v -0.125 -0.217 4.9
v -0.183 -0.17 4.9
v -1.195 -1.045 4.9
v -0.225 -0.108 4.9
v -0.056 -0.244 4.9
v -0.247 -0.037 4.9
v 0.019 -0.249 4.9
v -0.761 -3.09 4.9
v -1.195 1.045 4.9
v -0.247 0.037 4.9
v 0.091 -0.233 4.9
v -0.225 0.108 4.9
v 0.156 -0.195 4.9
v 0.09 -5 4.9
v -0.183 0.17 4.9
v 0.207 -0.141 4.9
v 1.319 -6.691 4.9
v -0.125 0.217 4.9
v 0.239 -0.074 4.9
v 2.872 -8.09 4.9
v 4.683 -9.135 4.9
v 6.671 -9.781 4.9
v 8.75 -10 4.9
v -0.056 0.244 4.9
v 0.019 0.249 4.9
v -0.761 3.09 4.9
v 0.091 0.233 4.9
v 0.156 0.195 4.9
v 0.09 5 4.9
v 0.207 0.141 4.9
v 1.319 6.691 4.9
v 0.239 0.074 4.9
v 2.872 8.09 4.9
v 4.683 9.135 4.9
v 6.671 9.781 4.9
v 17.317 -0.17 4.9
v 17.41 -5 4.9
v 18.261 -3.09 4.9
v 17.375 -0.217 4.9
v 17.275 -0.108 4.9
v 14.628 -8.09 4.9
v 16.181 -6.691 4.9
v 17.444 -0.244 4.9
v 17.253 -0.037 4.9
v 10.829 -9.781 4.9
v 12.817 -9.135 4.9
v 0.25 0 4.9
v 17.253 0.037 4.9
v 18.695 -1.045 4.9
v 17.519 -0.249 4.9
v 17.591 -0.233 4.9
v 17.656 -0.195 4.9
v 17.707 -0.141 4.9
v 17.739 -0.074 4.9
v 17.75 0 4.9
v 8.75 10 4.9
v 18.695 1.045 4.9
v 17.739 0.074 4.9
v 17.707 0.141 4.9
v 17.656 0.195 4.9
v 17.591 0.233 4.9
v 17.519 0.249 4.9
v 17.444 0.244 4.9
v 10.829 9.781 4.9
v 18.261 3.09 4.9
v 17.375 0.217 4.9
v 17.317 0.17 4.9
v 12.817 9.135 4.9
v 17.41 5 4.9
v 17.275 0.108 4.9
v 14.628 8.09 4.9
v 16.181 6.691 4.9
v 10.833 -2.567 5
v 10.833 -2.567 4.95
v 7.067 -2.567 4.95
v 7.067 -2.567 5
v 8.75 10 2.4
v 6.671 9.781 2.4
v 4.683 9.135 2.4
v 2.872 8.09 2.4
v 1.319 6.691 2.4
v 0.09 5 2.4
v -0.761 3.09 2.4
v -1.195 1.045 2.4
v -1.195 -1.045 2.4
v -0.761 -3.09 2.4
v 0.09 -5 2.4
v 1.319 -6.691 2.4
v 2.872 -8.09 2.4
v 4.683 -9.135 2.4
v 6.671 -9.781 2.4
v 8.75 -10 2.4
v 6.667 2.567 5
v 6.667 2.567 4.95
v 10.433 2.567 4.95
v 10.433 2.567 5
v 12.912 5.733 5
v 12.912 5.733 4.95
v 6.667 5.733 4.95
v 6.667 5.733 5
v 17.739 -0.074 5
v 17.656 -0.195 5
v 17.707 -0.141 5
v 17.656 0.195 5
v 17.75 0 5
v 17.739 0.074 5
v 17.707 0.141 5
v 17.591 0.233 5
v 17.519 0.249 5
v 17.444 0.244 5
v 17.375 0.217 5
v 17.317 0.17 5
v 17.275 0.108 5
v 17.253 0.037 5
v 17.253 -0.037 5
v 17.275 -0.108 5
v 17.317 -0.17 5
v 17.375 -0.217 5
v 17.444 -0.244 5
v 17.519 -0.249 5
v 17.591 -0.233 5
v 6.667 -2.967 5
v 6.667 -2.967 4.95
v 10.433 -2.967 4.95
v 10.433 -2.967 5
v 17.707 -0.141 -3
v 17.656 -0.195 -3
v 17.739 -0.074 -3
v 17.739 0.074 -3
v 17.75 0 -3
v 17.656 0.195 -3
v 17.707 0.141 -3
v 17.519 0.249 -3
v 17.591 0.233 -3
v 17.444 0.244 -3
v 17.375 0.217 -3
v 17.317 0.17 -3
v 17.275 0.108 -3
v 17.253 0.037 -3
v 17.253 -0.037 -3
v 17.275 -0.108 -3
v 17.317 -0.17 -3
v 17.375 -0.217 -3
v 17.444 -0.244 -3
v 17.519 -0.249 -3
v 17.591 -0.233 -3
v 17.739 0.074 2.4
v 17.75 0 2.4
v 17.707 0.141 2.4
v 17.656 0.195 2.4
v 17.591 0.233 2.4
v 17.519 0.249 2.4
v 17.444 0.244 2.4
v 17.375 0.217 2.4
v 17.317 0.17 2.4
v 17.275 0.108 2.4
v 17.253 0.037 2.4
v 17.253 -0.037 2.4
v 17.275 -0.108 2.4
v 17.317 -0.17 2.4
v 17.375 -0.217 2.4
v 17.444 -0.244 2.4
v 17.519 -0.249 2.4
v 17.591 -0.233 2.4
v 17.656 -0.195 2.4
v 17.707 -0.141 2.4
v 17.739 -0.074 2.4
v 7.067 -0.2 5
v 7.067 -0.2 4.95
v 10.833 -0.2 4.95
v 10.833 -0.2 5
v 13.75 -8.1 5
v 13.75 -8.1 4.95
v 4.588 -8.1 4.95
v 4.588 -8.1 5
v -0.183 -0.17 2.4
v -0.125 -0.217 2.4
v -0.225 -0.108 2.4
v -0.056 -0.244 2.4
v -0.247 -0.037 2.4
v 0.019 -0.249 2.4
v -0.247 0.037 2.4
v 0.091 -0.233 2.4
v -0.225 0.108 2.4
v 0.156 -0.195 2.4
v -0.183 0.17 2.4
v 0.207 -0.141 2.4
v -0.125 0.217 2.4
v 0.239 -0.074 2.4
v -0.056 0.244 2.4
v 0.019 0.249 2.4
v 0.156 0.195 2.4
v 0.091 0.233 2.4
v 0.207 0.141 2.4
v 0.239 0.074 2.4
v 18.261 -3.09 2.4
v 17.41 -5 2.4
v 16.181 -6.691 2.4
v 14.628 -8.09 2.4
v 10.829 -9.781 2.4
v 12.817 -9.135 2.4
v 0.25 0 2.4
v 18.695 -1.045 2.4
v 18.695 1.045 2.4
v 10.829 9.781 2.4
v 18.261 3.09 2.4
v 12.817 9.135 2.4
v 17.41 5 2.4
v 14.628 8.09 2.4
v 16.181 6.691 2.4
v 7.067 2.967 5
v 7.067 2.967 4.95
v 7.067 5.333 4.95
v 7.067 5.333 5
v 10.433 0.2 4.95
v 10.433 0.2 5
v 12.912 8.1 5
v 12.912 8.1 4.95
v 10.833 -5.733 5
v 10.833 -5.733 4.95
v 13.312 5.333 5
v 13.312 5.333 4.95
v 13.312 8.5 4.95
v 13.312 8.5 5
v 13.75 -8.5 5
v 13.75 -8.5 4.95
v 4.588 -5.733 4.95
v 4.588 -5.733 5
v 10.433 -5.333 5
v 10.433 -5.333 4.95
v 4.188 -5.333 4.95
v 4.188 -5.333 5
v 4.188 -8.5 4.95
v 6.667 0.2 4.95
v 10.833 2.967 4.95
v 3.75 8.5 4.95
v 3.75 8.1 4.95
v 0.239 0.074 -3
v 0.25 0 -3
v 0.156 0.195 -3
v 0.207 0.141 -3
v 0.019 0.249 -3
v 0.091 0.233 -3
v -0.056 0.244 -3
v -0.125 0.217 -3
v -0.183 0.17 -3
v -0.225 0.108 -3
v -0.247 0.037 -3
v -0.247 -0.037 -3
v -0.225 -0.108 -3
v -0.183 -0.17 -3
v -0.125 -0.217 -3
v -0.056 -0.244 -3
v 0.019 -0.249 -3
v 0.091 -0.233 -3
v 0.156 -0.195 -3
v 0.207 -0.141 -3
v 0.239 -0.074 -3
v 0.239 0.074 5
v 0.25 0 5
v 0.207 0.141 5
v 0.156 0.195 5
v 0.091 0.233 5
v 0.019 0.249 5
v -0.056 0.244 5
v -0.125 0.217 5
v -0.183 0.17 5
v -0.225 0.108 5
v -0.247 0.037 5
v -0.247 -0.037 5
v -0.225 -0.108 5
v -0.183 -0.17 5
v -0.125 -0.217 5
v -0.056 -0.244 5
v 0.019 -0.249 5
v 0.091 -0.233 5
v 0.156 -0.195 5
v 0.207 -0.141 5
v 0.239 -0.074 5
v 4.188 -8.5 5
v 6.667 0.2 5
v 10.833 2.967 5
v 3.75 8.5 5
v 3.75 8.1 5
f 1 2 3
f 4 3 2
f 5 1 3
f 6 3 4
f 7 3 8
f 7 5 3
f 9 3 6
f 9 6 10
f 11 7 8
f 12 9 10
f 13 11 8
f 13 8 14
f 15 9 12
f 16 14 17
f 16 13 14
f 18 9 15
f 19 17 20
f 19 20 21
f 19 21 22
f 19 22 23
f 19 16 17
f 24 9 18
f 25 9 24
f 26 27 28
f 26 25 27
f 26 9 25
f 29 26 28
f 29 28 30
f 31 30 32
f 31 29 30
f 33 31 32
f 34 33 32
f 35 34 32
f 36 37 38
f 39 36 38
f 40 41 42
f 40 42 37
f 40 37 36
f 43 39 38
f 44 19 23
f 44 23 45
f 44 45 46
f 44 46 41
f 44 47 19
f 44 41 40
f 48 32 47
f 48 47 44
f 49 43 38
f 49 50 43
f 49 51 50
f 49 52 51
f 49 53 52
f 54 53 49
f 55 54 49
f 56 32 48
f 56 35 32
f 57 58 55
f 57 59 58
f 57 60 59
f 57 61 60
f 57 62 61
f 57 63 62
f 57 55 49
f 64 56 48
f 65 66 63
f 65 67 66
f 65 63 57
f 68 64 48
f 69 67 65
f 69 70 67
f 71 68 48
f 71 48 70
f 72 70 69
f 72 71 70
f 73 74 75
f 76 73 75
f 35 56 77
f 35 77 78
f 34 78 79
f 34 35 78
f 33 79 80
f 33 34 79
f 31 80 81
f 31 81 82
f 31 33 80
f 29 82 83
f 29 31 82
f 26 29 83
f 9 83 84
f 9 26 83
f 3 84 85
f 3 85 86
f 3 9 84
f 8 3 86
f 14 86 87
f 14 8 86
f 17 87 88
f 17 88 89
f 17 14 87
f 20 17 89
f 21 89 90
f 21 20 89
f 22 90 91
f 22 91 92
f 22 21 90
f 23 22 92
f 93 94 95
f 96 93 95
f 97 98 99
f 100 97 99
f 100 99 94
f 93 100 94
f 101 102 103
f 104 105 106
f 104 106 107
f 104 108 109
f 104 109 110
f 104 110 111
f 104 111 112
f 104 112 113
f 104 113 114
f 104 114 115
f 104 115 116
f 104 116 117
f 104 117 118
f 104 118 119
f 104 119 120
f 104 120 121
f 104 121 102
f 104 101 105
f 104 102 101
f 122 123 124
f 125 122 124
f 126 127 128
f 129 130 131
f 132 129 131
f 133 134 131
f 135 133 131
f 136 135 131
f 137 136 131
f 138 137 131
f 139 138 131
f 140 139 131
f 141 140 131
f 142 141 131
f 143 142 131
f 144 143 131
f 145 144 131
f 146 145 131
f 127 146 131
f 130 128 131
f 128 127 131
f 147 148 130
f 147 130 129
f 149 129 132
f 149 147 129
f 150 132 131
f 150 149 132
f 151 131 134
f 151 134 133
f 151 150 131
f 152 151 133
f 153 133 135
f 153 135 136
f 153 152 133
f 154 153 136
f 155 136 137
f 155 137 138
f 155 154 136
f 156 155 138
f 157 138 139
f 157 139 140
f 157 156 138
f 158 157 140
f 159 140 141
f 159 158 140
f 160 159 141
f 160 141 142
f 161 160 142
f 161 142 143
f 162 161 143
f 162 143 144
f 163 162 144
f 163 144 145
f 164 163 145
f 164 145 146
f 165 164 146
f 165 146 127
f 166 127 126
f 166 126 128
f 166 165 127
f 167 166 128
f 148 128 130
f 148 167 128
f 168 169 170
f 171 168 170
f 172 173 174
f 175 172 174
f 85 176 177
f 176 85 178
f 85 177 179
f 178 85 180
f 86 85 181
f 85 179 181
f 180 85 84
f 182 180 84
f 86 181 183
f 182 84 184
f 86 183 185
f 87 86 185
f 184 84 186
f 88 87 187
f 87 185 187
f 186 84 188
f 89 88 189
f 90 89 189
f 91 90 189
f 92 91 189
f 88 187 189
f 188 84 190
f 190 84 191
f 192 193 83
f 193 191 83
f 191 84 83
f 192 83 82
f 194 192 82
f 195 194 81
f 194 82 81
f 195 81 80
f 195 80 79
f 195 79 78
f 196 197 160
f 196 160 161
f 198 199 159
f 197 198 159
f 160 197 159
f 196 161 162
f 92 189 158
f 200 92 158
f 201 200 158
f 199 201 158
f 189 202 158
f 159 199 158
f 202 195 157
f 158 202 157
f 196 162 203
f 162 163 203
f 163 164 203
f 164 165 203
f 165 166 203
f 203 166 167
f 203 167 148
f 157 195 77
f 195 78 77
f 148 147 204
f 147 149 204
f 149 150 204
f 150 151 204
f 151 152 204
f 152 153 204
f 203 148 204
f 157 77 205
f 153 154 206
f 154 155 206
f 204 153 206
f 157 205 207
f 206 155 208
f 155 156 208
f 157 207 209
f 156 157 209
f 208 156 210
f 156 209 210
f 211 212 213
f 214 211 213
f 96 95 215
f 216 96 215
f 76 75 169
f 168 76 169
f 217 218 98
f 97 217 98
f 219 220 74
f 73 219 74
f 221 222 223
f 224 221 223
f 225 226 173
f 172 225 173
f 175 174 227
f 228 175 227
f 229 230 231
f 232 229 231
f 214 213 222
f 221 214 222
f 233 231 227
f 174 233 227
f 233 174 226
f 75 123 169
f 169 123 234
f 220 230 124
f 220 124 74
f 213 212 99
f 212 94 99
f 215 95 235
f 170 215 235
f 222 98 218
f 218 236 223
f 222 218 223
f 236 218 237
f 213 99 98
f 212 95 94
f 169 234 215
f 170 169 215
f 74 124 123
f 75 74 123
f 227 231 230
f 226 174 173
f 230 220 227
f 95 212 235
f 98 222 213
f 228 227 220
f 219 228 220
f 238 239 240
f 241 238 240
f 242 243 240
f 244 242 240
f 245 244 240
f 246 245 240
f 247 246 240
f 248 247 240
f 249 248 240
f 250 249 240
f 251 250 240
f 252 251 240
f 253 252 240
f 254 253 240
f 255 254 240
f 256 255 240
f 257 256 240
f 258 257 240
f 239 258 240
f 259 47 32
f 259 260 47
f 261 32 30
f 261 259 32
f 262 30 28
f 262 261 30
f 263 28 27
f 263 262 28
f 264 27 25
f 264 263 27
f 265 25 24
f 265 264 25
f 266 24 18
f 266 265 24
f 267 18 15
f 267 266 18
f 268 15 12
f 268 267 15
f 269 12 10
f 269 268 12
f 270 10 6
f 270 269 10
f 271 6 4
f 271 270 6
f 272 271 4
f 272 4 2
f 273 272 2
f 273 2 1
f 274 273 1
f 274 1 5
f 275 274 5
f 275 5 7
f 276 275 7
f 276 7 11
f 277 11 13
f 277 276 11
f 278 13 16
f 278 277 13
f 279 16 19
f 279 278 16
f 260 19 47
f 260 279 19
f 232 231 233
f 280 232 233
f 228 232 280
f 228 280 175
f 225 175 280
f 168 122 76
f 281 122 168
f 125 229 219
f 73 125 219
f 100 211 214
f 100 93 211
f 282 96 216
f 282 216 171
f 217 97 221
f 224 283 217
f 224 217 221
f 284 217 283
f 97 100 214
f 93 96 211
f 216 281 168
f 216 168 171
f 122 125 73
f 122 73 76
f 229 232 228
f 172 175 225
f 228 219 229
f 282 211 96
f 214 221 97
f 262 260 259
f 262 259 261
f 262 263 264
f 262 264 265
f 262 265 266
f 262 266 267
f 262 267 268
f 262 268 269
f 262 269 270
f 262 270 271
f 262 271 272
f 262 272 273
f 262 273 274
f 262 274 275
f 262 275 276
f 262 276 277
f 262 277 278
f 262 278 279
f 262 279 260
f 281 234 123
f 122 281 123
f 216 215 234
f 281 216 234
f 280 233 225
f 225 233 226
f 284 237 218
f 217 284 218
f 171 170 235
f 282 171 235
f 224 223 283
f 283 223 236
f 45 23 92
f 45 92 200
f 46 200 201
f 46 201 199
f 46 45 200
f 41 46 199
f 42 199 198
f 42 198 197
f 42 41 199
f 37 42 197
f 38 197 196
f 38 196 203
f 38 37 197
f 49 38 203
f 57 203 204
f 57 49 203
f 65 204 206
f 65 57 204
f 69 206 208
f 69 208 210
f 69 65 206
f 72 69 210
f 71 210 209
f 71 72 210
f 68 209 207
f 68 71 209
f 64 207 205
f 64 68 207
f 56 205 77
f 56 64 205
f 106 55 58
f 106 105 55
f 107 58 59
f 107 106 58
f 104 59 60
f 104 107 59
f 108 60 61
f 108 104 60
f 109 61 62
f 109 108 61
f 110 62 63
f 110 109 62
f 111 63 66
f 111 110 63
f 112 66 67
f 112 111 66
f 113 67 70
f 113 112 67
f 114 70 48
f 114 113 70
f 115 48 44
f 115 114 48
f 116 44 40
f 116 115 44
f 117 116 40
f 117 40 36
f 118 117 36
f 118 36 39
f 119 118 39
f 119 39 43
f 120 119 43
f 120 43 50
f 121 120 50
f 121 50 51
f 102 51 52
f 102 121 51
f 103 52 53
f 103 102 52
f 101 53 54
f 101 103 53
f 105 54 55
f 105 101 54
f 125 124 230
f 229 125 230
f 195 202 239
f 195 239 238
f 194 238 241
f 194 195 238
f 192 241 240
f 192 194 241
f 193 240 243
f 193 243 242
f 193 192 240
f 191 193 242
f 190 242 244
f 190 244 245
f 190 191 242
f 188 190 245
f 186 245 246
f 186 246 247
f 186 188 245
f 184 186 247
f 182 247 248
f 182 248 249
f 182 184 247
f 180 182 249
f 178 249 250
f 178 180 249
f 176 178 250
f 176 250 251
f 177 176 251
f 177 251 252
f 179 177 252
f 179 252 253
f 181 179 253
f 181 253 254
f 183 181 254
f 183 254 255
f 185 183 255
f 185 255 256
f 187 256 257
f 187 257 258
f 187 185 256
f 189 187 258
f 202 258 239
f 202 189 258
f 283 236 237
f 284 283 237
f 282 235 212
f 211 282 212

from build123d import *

# Parameters (mm, degrees)
PAD001_DEPTH   = 2.5
SKETCH_R       = 0.25
PAD_DEPTH      = 5
PAD_DEPTH_BACK = 3
PAD002_DEPTH   = 0.05


with BuildPart() as pad001:
    # Sketch001 → Pad001 (new body)
    with BuildSketch(Plane.XY.offset(4.9)):
        with BuildLine():
            ThreePointArc((8.749963, 10), (-1.25, 0), (8.749963, -10))
            Line((8.749963, -10), (8.749992, -10))
            ThreePointArc((8.749992, -10), (18.75, 0), (8.749992, 10))
            Line((8.749963, 10), (8.749992, 10))
        make_face()
    extrude(amount=-PAD001_DEPTH)


with BuildPart() as pad:
    # Sketch → Pad (new body, two sides)
    with BuildSketch(Plane.XY) as pad_sk:
        Circle(SKETCH_R)
        with Locations((17.5, 0)):
            Circle(SKETCH_R)
    extrude(amount=PAD_DEPTH)
    extrude(pad_sk.sketch, amount=-PAD_DEPTH_BACK)


with BuildPart() as r_ldr_d20mm_p17_5mm_vertical:
    # Sketch002 → Pad002 (new body)
    with BuildSketch(Plane.XY.offset(4.95)):
        Polygon((3.75, 8.1), (12.9125, 8.1), (12.9125, 5.733333), (6.666667, 5.733333), (6.666667, 5.333333), (6.666667, 2.566667), (7.066667, 2.566667), (10.433333, 2.566667), (10.433333, 0.2), (6.666667, 0.2), (6.666667, -0.2), (6.666667, -2.966667), (7.066667, -2.966667), (10.433333, -2.966667), (10.433333, -5.333333), (4.1875, -5.333333), (4.1875, -5.733333), (4.1875, -8.5), (4.5875, -8.5), (13.75, -8.5), (13.75, -8.1), (4.5875, -8.1), (4.5875, -5.733333), (10.433333, -5.733333), (10.833333, -5.733333), (10.833333, -2.966667), (10.833333, -2.566667), (7.066667, -2.566667), (7.066667, -0.2), (10.433333, -0.2), (10.833333, -0.2), (10.833333, 2.566667), (10.833333, 2.966667), (7.066667, 2.966667), (7.066667, 5.333333), (12.9125, 5.333333), (13.3125, 5.333333), (13.3125, 8.1), (13.3125, 8.5), (3.75, 8.5), align=None)
    extrude(amount=PAD002_DEPTH)

    # Pad002_mp_cp: union Pad001, Pad
    add(pad001.part)
    add(pad.part)


solid = r_ldr_d20mm_p17_5mm_vertical.part
